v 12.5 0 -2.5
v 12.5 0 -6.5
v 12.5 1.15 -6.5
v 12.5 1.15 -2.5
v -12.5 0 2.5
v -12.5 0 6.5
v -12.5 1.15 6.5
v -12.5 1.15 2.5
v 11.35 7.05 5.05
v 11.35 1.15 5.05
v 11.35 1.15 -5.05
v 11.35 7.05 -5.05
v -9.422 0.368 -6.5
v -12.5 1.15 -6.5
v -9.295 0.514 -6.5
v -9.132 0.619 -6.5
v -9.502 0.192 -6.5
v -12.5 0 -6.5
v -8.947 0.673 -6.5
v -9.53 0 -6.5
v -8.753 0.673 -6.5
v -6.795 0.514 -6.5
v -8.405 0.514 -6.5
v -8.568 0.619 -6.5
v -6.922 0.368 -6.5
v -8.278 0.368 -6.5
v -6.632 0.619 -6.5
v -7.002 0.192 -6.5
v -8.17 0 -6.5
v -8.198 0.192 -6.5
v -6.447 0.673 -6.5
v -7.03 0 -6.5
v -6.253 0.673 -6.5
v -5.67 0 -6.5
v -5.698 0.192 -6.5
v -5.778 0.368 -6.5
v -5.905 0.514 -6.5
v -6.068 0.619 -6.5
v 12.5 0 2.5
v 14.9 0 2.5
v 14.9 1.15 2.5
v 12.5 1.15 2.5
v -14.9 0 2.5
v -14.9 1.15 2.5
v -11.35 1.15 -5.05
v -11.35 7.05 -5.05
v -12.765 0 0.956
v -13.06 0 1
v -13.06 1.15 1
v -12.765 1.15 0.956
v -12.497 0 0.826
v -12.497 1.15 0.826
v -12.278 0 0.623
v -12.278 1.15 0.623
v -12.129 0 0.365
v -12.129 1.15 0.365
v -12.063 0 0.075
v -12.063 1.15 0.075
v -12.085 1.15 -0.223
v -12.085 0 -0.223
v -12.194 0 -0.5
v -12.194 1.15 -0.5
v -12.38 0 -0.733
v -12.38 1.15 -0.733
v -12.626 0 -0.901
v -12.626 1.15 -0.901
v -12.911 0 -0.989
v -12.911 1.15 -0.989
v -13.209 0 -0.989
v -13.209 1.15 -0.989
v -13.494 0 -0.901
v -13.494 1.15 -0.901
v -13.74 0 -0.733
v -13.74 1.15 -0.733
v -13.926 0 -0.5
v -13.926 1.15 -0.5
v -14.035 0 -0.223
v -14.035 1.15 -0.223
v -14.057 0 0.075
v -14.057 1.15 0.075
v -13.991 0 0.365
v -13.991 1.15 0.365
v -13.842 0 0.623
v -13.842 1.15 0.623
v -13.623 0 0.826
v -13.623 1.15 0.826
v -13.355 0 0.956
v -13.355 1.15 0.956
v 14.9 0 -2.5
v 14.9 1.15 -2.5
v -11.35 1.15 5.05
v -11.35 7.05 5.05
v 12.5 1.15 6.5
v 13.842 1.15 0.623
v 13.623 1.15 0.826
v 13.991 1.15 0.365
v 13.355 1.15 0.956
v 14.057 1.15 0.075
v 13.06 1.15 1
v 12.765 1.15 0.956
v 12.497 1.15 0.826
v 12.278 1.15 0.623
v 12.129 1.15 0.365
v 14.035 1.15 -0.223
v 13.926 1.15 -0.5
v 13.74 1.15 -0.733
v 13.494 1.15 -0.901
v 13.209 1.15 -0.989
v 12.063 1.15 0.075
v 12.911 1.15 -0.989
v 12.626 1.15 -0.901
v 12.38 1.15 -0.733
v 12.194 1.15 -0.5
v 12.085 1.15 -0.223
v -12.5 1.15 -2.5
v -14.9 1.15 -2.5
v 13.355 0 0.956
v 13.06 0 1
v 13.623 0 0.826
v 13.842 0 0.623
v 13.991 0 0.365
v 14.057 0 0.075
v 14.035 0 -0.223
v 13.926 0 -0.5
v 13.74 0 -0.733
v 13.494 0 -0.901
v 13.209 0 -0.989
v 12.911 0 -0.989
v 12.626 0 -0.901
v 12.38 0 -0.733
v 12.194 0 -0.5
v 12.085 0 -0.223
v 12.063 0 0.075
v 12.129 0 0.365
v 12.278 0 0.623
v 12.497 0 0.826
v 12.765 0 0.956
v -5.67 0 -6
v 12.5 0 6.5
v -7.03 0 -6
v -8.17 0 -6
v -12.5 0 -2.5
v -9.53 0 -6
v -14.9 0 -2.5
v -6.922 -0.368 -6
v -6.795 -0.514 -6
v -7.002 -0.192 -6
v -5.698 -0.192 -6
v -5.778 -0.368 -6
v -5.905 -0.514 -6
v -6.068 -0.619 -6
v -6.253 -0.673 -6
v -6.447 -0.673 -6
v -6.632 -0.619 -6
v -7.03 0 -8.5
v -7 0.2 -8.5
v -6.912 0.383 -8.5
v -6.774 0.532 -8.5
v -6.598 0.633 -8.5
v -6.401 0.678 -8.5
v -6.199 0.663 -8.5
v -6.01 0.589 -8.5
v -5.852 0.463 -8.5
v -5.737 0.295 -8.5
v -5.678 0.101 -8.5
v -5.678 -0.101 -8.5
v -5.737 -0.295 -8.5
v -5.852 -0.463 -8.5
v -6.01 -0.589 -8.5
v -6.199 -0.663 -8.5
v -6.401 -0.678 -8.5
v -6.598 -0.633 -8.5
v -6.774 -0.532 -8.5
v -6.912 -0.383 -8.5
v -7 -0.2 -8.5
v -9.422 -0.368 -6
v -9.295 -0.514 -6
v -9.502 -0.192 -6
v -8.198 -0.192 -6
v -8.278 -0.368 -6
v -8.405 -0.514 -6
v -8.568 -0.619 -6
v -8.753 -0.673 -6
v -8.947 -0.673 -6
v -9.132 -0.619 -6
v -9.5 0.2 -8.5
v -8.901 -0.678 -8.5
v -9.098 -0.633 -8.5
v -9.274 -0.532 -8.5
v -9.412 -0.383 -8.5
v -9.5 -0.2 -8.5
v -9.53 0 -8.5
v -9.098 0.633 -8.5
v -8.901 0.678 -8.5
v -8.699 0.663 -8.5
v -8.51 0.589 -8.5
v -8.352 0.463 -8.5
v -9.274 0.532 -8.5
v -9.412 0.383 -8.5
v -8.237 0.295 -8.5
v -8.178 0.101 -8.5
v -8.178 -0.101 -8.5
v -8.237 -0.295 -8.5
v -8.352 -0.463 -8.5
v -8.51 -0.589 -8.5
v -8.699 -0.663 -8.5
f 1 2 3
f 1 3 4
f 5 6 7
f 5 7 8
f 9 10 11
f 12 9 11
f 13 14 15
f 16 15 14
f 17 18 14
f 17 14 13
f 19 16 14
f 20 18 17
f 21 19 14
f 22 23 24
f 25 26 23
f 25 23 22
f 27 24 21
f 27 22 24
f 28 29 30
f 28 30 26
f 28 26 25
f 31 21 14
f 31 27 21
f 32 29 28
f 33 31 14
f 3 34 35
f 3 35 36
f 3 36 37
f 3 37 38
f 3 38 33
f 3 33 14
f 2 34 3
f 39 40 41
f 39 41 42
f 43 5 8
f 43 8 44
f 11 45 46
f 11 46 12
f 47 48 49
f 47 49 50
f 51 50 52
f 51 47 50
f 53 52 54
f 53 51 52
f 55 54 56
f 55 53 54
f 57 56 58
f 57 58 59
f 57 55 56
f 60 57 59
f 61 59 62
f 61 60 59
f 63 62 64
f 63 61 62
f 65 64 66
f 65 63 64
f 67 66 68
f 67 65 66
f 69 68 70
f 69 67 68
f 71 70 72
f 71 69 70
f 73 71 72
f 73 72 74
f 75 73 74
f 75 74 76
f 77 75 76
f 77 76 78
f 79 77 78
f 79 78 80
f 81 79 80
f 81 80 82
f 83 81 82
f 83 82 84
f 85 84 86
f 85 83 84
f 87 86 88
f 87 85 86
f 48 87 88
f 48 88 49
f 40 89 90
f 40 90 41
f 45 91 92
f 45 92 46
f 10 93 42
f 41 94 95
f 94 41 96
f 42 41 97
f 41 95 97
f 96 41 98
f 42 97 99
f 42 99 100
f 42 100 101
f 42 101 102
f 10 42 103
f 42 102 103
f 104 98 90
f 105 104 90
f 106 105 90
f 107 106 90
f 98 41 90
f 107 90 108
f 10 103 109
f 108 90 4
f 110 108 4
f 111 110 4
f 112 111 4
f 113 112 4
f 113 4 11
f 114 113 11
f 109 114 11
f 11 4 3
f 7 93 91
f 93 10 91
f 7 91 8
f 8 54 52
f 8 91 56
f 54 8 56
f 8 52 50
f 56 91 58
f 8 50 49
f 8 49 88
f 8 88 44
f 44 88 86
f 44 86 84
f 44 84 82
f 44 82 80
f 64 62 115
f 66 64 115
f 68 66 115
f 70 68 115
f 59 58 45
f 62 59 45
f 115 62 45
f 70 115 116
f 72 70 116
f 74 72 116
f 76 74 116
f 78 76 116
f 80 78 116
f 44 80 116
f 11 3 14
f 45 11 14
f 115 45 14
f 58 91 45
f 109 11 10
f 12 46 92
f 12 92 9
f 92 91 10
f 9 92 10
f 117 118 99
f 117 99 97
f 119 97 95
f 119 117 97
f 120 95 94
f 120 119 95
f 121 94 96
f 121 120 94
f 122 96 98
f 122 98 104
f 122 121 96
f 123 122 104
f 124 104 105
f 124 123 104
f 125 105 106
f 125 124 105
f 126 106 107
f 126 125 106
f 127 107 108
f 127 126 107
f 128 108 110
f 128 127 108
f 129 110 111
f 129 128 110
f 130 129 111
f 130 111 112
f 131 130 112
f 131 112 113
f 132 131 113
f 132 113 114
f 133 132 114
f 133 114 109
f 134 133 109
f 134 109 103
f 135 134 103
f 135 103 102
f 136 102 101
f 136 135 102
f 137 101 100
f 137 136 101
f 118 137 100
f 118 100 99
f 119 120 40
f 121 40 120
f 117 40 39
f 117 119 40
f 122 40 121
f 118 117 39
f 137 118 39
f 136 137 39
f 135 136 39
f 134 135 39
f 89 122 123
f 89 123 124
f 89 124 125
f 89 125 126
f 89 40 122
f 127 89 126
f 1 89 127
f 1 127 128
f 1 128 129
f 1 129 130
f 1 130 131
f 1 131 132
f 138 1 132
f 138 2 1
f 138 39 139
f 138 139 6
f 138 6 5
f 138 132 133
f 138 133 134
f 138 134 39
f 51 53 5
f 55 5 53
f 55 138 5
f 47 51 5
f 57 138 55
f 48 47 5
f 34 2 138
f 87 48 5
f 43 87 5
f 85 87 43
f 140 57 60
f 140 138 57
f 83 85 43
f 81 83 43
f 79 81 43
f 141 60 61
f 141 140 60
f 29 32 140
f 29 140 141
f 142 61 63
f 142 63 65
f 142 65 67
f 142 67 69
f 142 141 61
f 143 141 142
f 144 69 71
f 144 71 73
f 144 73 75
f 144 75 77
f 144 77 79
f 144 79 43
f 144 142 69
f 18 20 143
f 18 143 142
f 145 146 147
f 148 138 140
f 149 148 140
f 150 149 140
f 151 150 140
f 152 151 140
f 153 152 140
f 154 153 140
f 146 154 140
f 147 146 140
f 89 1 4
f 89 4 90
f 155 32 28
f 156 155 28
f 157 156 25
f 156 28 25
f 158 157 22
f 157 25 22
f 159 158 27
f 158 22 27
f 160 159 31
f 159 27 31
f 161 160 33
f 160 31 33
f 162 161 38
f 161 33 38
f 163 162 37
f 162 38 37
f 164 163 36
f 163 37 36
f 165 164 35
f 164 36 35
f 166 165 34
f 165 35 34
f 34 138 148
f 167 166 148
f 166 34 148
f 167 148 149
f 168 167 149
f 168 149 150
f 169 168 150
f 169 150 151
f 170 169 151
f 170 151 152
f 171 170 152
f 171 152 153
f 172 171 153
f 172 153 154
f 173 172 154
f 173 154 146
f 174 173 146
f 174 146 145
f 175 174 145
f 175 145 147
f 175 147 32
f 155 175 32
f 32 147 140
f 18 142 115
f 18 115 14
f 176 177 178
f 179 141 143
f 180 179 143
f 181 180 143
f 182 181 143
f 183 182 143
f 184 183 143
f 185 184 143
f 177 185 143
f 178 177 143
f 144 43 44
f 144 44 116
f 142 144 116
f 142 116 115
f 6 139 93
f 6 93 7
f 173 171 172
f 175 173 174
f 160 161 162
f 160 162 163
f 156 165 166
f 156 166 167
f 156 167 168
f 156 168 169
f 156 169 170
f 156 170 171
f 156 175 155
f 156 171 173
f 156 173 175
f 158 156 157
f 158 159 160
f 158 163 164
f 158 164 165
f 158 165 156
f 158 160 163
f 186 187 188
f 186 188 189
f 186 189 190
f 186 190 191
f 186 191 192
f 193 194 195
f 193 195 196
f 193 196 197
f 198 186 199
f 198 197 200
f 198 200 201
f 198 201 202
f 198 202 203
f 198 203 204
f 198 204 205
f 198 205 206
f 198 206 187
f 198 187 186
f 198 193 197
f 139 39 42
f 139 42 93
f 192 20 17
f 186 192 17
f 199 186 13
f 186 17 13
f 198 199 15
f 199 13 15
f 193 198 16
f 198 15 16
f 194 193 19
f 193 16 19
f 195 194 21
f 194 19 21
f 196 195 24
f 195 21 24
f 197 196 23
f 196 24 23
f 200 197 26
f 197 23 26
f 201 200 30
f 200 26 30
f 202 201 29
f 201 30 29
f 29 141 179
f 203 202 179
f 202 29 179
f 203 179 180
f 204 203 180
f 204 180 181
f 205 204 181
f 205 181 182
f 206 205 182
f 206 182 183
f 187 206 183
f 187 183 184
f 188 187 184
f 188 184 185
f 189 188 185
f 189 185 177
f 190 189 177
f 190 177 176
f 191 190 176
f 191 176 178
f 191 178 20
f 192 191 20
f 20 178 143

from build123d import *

# Parameters (mm, degrees)
SKETCH1_R                = 1
BOSS_EXTRUDE1_DEPTH      = 1.15
SKETCH2_W                = 22.7
SKETCH2_H                = 10.1
BOSS_EXTRUDE2_DEPTH      = 5.9
BOSS_EXTRUDE3_DEPTH      = 2
BOSS_EXTRUDE3_DEPTH_BACK = 0.5
SKETCH3_R                = 0.68


with BuildPart() as part:
    # Sketch1 → Boss-Extrude1 (new body)
    with BuildSketch(Plane(origin=(0, 0, 0), x_dir=(1, 0, 0), z_dir=(0, 1, 0))):
        Polygon((-12.5, 6.5), (12.5, 6.5), (12.5, 2.5), (14.9, 2.5), (14.9, -2.5), (12.5, -2.5), (12.5, -6.5), (-12.5, -6.5), (-12.5, -2.5), (-14.9, -2.5), (-14.9, 2.5), (-12.5, 2.5), align=None)
        with Locations(Location((13.06, 0, 0), (0, 0, 270))):
            Circle(SKETCH1_R, mode=Mode.SUBTRACT)
        with Locations(Location((-13.06, 0, 0), (0, 0, 270))):
            Circle(SKETCH1_R, mode=Mode.SUBTRACT)
    extrude(amount=BOSS_EXTRUDE1_DEPTH)

    # Sketch2 → Boss-Extrude2 (add)
    with BuildSketch(Plane(origin=(0, 1.15, 0), x_dir=(1, 0, 0), z_dir=(0, 1, 0))):
        Rectangle(SKETCH2_W, SKETCH2_H)
    extrude(amount=BOSS_EXTRUDE2_DEPTH)

    # Sketch3 → Boss-Extrude3 (add, two sides: drawn at the far end of the back side and taken through both)
    with BuildSketch(Plane(origin=(0, 0, -6.5), x_dir=(-1, 0, 0), z_dir=(0, 0, -1)).offset(-BOSS_EXTRUDE3_DEPTH_BACK)):
        with Locations((8.85, 0)):
            Circle(SKETCH3_R)
        with Locations((6.35, 0)):
            Circle(SKETCH3_R)
    extrude(amount=BOSS_EXTRUDE3_DEPTH + BOSS_EXTRUDE3_DEPTH_BACK)


solid = part.part
